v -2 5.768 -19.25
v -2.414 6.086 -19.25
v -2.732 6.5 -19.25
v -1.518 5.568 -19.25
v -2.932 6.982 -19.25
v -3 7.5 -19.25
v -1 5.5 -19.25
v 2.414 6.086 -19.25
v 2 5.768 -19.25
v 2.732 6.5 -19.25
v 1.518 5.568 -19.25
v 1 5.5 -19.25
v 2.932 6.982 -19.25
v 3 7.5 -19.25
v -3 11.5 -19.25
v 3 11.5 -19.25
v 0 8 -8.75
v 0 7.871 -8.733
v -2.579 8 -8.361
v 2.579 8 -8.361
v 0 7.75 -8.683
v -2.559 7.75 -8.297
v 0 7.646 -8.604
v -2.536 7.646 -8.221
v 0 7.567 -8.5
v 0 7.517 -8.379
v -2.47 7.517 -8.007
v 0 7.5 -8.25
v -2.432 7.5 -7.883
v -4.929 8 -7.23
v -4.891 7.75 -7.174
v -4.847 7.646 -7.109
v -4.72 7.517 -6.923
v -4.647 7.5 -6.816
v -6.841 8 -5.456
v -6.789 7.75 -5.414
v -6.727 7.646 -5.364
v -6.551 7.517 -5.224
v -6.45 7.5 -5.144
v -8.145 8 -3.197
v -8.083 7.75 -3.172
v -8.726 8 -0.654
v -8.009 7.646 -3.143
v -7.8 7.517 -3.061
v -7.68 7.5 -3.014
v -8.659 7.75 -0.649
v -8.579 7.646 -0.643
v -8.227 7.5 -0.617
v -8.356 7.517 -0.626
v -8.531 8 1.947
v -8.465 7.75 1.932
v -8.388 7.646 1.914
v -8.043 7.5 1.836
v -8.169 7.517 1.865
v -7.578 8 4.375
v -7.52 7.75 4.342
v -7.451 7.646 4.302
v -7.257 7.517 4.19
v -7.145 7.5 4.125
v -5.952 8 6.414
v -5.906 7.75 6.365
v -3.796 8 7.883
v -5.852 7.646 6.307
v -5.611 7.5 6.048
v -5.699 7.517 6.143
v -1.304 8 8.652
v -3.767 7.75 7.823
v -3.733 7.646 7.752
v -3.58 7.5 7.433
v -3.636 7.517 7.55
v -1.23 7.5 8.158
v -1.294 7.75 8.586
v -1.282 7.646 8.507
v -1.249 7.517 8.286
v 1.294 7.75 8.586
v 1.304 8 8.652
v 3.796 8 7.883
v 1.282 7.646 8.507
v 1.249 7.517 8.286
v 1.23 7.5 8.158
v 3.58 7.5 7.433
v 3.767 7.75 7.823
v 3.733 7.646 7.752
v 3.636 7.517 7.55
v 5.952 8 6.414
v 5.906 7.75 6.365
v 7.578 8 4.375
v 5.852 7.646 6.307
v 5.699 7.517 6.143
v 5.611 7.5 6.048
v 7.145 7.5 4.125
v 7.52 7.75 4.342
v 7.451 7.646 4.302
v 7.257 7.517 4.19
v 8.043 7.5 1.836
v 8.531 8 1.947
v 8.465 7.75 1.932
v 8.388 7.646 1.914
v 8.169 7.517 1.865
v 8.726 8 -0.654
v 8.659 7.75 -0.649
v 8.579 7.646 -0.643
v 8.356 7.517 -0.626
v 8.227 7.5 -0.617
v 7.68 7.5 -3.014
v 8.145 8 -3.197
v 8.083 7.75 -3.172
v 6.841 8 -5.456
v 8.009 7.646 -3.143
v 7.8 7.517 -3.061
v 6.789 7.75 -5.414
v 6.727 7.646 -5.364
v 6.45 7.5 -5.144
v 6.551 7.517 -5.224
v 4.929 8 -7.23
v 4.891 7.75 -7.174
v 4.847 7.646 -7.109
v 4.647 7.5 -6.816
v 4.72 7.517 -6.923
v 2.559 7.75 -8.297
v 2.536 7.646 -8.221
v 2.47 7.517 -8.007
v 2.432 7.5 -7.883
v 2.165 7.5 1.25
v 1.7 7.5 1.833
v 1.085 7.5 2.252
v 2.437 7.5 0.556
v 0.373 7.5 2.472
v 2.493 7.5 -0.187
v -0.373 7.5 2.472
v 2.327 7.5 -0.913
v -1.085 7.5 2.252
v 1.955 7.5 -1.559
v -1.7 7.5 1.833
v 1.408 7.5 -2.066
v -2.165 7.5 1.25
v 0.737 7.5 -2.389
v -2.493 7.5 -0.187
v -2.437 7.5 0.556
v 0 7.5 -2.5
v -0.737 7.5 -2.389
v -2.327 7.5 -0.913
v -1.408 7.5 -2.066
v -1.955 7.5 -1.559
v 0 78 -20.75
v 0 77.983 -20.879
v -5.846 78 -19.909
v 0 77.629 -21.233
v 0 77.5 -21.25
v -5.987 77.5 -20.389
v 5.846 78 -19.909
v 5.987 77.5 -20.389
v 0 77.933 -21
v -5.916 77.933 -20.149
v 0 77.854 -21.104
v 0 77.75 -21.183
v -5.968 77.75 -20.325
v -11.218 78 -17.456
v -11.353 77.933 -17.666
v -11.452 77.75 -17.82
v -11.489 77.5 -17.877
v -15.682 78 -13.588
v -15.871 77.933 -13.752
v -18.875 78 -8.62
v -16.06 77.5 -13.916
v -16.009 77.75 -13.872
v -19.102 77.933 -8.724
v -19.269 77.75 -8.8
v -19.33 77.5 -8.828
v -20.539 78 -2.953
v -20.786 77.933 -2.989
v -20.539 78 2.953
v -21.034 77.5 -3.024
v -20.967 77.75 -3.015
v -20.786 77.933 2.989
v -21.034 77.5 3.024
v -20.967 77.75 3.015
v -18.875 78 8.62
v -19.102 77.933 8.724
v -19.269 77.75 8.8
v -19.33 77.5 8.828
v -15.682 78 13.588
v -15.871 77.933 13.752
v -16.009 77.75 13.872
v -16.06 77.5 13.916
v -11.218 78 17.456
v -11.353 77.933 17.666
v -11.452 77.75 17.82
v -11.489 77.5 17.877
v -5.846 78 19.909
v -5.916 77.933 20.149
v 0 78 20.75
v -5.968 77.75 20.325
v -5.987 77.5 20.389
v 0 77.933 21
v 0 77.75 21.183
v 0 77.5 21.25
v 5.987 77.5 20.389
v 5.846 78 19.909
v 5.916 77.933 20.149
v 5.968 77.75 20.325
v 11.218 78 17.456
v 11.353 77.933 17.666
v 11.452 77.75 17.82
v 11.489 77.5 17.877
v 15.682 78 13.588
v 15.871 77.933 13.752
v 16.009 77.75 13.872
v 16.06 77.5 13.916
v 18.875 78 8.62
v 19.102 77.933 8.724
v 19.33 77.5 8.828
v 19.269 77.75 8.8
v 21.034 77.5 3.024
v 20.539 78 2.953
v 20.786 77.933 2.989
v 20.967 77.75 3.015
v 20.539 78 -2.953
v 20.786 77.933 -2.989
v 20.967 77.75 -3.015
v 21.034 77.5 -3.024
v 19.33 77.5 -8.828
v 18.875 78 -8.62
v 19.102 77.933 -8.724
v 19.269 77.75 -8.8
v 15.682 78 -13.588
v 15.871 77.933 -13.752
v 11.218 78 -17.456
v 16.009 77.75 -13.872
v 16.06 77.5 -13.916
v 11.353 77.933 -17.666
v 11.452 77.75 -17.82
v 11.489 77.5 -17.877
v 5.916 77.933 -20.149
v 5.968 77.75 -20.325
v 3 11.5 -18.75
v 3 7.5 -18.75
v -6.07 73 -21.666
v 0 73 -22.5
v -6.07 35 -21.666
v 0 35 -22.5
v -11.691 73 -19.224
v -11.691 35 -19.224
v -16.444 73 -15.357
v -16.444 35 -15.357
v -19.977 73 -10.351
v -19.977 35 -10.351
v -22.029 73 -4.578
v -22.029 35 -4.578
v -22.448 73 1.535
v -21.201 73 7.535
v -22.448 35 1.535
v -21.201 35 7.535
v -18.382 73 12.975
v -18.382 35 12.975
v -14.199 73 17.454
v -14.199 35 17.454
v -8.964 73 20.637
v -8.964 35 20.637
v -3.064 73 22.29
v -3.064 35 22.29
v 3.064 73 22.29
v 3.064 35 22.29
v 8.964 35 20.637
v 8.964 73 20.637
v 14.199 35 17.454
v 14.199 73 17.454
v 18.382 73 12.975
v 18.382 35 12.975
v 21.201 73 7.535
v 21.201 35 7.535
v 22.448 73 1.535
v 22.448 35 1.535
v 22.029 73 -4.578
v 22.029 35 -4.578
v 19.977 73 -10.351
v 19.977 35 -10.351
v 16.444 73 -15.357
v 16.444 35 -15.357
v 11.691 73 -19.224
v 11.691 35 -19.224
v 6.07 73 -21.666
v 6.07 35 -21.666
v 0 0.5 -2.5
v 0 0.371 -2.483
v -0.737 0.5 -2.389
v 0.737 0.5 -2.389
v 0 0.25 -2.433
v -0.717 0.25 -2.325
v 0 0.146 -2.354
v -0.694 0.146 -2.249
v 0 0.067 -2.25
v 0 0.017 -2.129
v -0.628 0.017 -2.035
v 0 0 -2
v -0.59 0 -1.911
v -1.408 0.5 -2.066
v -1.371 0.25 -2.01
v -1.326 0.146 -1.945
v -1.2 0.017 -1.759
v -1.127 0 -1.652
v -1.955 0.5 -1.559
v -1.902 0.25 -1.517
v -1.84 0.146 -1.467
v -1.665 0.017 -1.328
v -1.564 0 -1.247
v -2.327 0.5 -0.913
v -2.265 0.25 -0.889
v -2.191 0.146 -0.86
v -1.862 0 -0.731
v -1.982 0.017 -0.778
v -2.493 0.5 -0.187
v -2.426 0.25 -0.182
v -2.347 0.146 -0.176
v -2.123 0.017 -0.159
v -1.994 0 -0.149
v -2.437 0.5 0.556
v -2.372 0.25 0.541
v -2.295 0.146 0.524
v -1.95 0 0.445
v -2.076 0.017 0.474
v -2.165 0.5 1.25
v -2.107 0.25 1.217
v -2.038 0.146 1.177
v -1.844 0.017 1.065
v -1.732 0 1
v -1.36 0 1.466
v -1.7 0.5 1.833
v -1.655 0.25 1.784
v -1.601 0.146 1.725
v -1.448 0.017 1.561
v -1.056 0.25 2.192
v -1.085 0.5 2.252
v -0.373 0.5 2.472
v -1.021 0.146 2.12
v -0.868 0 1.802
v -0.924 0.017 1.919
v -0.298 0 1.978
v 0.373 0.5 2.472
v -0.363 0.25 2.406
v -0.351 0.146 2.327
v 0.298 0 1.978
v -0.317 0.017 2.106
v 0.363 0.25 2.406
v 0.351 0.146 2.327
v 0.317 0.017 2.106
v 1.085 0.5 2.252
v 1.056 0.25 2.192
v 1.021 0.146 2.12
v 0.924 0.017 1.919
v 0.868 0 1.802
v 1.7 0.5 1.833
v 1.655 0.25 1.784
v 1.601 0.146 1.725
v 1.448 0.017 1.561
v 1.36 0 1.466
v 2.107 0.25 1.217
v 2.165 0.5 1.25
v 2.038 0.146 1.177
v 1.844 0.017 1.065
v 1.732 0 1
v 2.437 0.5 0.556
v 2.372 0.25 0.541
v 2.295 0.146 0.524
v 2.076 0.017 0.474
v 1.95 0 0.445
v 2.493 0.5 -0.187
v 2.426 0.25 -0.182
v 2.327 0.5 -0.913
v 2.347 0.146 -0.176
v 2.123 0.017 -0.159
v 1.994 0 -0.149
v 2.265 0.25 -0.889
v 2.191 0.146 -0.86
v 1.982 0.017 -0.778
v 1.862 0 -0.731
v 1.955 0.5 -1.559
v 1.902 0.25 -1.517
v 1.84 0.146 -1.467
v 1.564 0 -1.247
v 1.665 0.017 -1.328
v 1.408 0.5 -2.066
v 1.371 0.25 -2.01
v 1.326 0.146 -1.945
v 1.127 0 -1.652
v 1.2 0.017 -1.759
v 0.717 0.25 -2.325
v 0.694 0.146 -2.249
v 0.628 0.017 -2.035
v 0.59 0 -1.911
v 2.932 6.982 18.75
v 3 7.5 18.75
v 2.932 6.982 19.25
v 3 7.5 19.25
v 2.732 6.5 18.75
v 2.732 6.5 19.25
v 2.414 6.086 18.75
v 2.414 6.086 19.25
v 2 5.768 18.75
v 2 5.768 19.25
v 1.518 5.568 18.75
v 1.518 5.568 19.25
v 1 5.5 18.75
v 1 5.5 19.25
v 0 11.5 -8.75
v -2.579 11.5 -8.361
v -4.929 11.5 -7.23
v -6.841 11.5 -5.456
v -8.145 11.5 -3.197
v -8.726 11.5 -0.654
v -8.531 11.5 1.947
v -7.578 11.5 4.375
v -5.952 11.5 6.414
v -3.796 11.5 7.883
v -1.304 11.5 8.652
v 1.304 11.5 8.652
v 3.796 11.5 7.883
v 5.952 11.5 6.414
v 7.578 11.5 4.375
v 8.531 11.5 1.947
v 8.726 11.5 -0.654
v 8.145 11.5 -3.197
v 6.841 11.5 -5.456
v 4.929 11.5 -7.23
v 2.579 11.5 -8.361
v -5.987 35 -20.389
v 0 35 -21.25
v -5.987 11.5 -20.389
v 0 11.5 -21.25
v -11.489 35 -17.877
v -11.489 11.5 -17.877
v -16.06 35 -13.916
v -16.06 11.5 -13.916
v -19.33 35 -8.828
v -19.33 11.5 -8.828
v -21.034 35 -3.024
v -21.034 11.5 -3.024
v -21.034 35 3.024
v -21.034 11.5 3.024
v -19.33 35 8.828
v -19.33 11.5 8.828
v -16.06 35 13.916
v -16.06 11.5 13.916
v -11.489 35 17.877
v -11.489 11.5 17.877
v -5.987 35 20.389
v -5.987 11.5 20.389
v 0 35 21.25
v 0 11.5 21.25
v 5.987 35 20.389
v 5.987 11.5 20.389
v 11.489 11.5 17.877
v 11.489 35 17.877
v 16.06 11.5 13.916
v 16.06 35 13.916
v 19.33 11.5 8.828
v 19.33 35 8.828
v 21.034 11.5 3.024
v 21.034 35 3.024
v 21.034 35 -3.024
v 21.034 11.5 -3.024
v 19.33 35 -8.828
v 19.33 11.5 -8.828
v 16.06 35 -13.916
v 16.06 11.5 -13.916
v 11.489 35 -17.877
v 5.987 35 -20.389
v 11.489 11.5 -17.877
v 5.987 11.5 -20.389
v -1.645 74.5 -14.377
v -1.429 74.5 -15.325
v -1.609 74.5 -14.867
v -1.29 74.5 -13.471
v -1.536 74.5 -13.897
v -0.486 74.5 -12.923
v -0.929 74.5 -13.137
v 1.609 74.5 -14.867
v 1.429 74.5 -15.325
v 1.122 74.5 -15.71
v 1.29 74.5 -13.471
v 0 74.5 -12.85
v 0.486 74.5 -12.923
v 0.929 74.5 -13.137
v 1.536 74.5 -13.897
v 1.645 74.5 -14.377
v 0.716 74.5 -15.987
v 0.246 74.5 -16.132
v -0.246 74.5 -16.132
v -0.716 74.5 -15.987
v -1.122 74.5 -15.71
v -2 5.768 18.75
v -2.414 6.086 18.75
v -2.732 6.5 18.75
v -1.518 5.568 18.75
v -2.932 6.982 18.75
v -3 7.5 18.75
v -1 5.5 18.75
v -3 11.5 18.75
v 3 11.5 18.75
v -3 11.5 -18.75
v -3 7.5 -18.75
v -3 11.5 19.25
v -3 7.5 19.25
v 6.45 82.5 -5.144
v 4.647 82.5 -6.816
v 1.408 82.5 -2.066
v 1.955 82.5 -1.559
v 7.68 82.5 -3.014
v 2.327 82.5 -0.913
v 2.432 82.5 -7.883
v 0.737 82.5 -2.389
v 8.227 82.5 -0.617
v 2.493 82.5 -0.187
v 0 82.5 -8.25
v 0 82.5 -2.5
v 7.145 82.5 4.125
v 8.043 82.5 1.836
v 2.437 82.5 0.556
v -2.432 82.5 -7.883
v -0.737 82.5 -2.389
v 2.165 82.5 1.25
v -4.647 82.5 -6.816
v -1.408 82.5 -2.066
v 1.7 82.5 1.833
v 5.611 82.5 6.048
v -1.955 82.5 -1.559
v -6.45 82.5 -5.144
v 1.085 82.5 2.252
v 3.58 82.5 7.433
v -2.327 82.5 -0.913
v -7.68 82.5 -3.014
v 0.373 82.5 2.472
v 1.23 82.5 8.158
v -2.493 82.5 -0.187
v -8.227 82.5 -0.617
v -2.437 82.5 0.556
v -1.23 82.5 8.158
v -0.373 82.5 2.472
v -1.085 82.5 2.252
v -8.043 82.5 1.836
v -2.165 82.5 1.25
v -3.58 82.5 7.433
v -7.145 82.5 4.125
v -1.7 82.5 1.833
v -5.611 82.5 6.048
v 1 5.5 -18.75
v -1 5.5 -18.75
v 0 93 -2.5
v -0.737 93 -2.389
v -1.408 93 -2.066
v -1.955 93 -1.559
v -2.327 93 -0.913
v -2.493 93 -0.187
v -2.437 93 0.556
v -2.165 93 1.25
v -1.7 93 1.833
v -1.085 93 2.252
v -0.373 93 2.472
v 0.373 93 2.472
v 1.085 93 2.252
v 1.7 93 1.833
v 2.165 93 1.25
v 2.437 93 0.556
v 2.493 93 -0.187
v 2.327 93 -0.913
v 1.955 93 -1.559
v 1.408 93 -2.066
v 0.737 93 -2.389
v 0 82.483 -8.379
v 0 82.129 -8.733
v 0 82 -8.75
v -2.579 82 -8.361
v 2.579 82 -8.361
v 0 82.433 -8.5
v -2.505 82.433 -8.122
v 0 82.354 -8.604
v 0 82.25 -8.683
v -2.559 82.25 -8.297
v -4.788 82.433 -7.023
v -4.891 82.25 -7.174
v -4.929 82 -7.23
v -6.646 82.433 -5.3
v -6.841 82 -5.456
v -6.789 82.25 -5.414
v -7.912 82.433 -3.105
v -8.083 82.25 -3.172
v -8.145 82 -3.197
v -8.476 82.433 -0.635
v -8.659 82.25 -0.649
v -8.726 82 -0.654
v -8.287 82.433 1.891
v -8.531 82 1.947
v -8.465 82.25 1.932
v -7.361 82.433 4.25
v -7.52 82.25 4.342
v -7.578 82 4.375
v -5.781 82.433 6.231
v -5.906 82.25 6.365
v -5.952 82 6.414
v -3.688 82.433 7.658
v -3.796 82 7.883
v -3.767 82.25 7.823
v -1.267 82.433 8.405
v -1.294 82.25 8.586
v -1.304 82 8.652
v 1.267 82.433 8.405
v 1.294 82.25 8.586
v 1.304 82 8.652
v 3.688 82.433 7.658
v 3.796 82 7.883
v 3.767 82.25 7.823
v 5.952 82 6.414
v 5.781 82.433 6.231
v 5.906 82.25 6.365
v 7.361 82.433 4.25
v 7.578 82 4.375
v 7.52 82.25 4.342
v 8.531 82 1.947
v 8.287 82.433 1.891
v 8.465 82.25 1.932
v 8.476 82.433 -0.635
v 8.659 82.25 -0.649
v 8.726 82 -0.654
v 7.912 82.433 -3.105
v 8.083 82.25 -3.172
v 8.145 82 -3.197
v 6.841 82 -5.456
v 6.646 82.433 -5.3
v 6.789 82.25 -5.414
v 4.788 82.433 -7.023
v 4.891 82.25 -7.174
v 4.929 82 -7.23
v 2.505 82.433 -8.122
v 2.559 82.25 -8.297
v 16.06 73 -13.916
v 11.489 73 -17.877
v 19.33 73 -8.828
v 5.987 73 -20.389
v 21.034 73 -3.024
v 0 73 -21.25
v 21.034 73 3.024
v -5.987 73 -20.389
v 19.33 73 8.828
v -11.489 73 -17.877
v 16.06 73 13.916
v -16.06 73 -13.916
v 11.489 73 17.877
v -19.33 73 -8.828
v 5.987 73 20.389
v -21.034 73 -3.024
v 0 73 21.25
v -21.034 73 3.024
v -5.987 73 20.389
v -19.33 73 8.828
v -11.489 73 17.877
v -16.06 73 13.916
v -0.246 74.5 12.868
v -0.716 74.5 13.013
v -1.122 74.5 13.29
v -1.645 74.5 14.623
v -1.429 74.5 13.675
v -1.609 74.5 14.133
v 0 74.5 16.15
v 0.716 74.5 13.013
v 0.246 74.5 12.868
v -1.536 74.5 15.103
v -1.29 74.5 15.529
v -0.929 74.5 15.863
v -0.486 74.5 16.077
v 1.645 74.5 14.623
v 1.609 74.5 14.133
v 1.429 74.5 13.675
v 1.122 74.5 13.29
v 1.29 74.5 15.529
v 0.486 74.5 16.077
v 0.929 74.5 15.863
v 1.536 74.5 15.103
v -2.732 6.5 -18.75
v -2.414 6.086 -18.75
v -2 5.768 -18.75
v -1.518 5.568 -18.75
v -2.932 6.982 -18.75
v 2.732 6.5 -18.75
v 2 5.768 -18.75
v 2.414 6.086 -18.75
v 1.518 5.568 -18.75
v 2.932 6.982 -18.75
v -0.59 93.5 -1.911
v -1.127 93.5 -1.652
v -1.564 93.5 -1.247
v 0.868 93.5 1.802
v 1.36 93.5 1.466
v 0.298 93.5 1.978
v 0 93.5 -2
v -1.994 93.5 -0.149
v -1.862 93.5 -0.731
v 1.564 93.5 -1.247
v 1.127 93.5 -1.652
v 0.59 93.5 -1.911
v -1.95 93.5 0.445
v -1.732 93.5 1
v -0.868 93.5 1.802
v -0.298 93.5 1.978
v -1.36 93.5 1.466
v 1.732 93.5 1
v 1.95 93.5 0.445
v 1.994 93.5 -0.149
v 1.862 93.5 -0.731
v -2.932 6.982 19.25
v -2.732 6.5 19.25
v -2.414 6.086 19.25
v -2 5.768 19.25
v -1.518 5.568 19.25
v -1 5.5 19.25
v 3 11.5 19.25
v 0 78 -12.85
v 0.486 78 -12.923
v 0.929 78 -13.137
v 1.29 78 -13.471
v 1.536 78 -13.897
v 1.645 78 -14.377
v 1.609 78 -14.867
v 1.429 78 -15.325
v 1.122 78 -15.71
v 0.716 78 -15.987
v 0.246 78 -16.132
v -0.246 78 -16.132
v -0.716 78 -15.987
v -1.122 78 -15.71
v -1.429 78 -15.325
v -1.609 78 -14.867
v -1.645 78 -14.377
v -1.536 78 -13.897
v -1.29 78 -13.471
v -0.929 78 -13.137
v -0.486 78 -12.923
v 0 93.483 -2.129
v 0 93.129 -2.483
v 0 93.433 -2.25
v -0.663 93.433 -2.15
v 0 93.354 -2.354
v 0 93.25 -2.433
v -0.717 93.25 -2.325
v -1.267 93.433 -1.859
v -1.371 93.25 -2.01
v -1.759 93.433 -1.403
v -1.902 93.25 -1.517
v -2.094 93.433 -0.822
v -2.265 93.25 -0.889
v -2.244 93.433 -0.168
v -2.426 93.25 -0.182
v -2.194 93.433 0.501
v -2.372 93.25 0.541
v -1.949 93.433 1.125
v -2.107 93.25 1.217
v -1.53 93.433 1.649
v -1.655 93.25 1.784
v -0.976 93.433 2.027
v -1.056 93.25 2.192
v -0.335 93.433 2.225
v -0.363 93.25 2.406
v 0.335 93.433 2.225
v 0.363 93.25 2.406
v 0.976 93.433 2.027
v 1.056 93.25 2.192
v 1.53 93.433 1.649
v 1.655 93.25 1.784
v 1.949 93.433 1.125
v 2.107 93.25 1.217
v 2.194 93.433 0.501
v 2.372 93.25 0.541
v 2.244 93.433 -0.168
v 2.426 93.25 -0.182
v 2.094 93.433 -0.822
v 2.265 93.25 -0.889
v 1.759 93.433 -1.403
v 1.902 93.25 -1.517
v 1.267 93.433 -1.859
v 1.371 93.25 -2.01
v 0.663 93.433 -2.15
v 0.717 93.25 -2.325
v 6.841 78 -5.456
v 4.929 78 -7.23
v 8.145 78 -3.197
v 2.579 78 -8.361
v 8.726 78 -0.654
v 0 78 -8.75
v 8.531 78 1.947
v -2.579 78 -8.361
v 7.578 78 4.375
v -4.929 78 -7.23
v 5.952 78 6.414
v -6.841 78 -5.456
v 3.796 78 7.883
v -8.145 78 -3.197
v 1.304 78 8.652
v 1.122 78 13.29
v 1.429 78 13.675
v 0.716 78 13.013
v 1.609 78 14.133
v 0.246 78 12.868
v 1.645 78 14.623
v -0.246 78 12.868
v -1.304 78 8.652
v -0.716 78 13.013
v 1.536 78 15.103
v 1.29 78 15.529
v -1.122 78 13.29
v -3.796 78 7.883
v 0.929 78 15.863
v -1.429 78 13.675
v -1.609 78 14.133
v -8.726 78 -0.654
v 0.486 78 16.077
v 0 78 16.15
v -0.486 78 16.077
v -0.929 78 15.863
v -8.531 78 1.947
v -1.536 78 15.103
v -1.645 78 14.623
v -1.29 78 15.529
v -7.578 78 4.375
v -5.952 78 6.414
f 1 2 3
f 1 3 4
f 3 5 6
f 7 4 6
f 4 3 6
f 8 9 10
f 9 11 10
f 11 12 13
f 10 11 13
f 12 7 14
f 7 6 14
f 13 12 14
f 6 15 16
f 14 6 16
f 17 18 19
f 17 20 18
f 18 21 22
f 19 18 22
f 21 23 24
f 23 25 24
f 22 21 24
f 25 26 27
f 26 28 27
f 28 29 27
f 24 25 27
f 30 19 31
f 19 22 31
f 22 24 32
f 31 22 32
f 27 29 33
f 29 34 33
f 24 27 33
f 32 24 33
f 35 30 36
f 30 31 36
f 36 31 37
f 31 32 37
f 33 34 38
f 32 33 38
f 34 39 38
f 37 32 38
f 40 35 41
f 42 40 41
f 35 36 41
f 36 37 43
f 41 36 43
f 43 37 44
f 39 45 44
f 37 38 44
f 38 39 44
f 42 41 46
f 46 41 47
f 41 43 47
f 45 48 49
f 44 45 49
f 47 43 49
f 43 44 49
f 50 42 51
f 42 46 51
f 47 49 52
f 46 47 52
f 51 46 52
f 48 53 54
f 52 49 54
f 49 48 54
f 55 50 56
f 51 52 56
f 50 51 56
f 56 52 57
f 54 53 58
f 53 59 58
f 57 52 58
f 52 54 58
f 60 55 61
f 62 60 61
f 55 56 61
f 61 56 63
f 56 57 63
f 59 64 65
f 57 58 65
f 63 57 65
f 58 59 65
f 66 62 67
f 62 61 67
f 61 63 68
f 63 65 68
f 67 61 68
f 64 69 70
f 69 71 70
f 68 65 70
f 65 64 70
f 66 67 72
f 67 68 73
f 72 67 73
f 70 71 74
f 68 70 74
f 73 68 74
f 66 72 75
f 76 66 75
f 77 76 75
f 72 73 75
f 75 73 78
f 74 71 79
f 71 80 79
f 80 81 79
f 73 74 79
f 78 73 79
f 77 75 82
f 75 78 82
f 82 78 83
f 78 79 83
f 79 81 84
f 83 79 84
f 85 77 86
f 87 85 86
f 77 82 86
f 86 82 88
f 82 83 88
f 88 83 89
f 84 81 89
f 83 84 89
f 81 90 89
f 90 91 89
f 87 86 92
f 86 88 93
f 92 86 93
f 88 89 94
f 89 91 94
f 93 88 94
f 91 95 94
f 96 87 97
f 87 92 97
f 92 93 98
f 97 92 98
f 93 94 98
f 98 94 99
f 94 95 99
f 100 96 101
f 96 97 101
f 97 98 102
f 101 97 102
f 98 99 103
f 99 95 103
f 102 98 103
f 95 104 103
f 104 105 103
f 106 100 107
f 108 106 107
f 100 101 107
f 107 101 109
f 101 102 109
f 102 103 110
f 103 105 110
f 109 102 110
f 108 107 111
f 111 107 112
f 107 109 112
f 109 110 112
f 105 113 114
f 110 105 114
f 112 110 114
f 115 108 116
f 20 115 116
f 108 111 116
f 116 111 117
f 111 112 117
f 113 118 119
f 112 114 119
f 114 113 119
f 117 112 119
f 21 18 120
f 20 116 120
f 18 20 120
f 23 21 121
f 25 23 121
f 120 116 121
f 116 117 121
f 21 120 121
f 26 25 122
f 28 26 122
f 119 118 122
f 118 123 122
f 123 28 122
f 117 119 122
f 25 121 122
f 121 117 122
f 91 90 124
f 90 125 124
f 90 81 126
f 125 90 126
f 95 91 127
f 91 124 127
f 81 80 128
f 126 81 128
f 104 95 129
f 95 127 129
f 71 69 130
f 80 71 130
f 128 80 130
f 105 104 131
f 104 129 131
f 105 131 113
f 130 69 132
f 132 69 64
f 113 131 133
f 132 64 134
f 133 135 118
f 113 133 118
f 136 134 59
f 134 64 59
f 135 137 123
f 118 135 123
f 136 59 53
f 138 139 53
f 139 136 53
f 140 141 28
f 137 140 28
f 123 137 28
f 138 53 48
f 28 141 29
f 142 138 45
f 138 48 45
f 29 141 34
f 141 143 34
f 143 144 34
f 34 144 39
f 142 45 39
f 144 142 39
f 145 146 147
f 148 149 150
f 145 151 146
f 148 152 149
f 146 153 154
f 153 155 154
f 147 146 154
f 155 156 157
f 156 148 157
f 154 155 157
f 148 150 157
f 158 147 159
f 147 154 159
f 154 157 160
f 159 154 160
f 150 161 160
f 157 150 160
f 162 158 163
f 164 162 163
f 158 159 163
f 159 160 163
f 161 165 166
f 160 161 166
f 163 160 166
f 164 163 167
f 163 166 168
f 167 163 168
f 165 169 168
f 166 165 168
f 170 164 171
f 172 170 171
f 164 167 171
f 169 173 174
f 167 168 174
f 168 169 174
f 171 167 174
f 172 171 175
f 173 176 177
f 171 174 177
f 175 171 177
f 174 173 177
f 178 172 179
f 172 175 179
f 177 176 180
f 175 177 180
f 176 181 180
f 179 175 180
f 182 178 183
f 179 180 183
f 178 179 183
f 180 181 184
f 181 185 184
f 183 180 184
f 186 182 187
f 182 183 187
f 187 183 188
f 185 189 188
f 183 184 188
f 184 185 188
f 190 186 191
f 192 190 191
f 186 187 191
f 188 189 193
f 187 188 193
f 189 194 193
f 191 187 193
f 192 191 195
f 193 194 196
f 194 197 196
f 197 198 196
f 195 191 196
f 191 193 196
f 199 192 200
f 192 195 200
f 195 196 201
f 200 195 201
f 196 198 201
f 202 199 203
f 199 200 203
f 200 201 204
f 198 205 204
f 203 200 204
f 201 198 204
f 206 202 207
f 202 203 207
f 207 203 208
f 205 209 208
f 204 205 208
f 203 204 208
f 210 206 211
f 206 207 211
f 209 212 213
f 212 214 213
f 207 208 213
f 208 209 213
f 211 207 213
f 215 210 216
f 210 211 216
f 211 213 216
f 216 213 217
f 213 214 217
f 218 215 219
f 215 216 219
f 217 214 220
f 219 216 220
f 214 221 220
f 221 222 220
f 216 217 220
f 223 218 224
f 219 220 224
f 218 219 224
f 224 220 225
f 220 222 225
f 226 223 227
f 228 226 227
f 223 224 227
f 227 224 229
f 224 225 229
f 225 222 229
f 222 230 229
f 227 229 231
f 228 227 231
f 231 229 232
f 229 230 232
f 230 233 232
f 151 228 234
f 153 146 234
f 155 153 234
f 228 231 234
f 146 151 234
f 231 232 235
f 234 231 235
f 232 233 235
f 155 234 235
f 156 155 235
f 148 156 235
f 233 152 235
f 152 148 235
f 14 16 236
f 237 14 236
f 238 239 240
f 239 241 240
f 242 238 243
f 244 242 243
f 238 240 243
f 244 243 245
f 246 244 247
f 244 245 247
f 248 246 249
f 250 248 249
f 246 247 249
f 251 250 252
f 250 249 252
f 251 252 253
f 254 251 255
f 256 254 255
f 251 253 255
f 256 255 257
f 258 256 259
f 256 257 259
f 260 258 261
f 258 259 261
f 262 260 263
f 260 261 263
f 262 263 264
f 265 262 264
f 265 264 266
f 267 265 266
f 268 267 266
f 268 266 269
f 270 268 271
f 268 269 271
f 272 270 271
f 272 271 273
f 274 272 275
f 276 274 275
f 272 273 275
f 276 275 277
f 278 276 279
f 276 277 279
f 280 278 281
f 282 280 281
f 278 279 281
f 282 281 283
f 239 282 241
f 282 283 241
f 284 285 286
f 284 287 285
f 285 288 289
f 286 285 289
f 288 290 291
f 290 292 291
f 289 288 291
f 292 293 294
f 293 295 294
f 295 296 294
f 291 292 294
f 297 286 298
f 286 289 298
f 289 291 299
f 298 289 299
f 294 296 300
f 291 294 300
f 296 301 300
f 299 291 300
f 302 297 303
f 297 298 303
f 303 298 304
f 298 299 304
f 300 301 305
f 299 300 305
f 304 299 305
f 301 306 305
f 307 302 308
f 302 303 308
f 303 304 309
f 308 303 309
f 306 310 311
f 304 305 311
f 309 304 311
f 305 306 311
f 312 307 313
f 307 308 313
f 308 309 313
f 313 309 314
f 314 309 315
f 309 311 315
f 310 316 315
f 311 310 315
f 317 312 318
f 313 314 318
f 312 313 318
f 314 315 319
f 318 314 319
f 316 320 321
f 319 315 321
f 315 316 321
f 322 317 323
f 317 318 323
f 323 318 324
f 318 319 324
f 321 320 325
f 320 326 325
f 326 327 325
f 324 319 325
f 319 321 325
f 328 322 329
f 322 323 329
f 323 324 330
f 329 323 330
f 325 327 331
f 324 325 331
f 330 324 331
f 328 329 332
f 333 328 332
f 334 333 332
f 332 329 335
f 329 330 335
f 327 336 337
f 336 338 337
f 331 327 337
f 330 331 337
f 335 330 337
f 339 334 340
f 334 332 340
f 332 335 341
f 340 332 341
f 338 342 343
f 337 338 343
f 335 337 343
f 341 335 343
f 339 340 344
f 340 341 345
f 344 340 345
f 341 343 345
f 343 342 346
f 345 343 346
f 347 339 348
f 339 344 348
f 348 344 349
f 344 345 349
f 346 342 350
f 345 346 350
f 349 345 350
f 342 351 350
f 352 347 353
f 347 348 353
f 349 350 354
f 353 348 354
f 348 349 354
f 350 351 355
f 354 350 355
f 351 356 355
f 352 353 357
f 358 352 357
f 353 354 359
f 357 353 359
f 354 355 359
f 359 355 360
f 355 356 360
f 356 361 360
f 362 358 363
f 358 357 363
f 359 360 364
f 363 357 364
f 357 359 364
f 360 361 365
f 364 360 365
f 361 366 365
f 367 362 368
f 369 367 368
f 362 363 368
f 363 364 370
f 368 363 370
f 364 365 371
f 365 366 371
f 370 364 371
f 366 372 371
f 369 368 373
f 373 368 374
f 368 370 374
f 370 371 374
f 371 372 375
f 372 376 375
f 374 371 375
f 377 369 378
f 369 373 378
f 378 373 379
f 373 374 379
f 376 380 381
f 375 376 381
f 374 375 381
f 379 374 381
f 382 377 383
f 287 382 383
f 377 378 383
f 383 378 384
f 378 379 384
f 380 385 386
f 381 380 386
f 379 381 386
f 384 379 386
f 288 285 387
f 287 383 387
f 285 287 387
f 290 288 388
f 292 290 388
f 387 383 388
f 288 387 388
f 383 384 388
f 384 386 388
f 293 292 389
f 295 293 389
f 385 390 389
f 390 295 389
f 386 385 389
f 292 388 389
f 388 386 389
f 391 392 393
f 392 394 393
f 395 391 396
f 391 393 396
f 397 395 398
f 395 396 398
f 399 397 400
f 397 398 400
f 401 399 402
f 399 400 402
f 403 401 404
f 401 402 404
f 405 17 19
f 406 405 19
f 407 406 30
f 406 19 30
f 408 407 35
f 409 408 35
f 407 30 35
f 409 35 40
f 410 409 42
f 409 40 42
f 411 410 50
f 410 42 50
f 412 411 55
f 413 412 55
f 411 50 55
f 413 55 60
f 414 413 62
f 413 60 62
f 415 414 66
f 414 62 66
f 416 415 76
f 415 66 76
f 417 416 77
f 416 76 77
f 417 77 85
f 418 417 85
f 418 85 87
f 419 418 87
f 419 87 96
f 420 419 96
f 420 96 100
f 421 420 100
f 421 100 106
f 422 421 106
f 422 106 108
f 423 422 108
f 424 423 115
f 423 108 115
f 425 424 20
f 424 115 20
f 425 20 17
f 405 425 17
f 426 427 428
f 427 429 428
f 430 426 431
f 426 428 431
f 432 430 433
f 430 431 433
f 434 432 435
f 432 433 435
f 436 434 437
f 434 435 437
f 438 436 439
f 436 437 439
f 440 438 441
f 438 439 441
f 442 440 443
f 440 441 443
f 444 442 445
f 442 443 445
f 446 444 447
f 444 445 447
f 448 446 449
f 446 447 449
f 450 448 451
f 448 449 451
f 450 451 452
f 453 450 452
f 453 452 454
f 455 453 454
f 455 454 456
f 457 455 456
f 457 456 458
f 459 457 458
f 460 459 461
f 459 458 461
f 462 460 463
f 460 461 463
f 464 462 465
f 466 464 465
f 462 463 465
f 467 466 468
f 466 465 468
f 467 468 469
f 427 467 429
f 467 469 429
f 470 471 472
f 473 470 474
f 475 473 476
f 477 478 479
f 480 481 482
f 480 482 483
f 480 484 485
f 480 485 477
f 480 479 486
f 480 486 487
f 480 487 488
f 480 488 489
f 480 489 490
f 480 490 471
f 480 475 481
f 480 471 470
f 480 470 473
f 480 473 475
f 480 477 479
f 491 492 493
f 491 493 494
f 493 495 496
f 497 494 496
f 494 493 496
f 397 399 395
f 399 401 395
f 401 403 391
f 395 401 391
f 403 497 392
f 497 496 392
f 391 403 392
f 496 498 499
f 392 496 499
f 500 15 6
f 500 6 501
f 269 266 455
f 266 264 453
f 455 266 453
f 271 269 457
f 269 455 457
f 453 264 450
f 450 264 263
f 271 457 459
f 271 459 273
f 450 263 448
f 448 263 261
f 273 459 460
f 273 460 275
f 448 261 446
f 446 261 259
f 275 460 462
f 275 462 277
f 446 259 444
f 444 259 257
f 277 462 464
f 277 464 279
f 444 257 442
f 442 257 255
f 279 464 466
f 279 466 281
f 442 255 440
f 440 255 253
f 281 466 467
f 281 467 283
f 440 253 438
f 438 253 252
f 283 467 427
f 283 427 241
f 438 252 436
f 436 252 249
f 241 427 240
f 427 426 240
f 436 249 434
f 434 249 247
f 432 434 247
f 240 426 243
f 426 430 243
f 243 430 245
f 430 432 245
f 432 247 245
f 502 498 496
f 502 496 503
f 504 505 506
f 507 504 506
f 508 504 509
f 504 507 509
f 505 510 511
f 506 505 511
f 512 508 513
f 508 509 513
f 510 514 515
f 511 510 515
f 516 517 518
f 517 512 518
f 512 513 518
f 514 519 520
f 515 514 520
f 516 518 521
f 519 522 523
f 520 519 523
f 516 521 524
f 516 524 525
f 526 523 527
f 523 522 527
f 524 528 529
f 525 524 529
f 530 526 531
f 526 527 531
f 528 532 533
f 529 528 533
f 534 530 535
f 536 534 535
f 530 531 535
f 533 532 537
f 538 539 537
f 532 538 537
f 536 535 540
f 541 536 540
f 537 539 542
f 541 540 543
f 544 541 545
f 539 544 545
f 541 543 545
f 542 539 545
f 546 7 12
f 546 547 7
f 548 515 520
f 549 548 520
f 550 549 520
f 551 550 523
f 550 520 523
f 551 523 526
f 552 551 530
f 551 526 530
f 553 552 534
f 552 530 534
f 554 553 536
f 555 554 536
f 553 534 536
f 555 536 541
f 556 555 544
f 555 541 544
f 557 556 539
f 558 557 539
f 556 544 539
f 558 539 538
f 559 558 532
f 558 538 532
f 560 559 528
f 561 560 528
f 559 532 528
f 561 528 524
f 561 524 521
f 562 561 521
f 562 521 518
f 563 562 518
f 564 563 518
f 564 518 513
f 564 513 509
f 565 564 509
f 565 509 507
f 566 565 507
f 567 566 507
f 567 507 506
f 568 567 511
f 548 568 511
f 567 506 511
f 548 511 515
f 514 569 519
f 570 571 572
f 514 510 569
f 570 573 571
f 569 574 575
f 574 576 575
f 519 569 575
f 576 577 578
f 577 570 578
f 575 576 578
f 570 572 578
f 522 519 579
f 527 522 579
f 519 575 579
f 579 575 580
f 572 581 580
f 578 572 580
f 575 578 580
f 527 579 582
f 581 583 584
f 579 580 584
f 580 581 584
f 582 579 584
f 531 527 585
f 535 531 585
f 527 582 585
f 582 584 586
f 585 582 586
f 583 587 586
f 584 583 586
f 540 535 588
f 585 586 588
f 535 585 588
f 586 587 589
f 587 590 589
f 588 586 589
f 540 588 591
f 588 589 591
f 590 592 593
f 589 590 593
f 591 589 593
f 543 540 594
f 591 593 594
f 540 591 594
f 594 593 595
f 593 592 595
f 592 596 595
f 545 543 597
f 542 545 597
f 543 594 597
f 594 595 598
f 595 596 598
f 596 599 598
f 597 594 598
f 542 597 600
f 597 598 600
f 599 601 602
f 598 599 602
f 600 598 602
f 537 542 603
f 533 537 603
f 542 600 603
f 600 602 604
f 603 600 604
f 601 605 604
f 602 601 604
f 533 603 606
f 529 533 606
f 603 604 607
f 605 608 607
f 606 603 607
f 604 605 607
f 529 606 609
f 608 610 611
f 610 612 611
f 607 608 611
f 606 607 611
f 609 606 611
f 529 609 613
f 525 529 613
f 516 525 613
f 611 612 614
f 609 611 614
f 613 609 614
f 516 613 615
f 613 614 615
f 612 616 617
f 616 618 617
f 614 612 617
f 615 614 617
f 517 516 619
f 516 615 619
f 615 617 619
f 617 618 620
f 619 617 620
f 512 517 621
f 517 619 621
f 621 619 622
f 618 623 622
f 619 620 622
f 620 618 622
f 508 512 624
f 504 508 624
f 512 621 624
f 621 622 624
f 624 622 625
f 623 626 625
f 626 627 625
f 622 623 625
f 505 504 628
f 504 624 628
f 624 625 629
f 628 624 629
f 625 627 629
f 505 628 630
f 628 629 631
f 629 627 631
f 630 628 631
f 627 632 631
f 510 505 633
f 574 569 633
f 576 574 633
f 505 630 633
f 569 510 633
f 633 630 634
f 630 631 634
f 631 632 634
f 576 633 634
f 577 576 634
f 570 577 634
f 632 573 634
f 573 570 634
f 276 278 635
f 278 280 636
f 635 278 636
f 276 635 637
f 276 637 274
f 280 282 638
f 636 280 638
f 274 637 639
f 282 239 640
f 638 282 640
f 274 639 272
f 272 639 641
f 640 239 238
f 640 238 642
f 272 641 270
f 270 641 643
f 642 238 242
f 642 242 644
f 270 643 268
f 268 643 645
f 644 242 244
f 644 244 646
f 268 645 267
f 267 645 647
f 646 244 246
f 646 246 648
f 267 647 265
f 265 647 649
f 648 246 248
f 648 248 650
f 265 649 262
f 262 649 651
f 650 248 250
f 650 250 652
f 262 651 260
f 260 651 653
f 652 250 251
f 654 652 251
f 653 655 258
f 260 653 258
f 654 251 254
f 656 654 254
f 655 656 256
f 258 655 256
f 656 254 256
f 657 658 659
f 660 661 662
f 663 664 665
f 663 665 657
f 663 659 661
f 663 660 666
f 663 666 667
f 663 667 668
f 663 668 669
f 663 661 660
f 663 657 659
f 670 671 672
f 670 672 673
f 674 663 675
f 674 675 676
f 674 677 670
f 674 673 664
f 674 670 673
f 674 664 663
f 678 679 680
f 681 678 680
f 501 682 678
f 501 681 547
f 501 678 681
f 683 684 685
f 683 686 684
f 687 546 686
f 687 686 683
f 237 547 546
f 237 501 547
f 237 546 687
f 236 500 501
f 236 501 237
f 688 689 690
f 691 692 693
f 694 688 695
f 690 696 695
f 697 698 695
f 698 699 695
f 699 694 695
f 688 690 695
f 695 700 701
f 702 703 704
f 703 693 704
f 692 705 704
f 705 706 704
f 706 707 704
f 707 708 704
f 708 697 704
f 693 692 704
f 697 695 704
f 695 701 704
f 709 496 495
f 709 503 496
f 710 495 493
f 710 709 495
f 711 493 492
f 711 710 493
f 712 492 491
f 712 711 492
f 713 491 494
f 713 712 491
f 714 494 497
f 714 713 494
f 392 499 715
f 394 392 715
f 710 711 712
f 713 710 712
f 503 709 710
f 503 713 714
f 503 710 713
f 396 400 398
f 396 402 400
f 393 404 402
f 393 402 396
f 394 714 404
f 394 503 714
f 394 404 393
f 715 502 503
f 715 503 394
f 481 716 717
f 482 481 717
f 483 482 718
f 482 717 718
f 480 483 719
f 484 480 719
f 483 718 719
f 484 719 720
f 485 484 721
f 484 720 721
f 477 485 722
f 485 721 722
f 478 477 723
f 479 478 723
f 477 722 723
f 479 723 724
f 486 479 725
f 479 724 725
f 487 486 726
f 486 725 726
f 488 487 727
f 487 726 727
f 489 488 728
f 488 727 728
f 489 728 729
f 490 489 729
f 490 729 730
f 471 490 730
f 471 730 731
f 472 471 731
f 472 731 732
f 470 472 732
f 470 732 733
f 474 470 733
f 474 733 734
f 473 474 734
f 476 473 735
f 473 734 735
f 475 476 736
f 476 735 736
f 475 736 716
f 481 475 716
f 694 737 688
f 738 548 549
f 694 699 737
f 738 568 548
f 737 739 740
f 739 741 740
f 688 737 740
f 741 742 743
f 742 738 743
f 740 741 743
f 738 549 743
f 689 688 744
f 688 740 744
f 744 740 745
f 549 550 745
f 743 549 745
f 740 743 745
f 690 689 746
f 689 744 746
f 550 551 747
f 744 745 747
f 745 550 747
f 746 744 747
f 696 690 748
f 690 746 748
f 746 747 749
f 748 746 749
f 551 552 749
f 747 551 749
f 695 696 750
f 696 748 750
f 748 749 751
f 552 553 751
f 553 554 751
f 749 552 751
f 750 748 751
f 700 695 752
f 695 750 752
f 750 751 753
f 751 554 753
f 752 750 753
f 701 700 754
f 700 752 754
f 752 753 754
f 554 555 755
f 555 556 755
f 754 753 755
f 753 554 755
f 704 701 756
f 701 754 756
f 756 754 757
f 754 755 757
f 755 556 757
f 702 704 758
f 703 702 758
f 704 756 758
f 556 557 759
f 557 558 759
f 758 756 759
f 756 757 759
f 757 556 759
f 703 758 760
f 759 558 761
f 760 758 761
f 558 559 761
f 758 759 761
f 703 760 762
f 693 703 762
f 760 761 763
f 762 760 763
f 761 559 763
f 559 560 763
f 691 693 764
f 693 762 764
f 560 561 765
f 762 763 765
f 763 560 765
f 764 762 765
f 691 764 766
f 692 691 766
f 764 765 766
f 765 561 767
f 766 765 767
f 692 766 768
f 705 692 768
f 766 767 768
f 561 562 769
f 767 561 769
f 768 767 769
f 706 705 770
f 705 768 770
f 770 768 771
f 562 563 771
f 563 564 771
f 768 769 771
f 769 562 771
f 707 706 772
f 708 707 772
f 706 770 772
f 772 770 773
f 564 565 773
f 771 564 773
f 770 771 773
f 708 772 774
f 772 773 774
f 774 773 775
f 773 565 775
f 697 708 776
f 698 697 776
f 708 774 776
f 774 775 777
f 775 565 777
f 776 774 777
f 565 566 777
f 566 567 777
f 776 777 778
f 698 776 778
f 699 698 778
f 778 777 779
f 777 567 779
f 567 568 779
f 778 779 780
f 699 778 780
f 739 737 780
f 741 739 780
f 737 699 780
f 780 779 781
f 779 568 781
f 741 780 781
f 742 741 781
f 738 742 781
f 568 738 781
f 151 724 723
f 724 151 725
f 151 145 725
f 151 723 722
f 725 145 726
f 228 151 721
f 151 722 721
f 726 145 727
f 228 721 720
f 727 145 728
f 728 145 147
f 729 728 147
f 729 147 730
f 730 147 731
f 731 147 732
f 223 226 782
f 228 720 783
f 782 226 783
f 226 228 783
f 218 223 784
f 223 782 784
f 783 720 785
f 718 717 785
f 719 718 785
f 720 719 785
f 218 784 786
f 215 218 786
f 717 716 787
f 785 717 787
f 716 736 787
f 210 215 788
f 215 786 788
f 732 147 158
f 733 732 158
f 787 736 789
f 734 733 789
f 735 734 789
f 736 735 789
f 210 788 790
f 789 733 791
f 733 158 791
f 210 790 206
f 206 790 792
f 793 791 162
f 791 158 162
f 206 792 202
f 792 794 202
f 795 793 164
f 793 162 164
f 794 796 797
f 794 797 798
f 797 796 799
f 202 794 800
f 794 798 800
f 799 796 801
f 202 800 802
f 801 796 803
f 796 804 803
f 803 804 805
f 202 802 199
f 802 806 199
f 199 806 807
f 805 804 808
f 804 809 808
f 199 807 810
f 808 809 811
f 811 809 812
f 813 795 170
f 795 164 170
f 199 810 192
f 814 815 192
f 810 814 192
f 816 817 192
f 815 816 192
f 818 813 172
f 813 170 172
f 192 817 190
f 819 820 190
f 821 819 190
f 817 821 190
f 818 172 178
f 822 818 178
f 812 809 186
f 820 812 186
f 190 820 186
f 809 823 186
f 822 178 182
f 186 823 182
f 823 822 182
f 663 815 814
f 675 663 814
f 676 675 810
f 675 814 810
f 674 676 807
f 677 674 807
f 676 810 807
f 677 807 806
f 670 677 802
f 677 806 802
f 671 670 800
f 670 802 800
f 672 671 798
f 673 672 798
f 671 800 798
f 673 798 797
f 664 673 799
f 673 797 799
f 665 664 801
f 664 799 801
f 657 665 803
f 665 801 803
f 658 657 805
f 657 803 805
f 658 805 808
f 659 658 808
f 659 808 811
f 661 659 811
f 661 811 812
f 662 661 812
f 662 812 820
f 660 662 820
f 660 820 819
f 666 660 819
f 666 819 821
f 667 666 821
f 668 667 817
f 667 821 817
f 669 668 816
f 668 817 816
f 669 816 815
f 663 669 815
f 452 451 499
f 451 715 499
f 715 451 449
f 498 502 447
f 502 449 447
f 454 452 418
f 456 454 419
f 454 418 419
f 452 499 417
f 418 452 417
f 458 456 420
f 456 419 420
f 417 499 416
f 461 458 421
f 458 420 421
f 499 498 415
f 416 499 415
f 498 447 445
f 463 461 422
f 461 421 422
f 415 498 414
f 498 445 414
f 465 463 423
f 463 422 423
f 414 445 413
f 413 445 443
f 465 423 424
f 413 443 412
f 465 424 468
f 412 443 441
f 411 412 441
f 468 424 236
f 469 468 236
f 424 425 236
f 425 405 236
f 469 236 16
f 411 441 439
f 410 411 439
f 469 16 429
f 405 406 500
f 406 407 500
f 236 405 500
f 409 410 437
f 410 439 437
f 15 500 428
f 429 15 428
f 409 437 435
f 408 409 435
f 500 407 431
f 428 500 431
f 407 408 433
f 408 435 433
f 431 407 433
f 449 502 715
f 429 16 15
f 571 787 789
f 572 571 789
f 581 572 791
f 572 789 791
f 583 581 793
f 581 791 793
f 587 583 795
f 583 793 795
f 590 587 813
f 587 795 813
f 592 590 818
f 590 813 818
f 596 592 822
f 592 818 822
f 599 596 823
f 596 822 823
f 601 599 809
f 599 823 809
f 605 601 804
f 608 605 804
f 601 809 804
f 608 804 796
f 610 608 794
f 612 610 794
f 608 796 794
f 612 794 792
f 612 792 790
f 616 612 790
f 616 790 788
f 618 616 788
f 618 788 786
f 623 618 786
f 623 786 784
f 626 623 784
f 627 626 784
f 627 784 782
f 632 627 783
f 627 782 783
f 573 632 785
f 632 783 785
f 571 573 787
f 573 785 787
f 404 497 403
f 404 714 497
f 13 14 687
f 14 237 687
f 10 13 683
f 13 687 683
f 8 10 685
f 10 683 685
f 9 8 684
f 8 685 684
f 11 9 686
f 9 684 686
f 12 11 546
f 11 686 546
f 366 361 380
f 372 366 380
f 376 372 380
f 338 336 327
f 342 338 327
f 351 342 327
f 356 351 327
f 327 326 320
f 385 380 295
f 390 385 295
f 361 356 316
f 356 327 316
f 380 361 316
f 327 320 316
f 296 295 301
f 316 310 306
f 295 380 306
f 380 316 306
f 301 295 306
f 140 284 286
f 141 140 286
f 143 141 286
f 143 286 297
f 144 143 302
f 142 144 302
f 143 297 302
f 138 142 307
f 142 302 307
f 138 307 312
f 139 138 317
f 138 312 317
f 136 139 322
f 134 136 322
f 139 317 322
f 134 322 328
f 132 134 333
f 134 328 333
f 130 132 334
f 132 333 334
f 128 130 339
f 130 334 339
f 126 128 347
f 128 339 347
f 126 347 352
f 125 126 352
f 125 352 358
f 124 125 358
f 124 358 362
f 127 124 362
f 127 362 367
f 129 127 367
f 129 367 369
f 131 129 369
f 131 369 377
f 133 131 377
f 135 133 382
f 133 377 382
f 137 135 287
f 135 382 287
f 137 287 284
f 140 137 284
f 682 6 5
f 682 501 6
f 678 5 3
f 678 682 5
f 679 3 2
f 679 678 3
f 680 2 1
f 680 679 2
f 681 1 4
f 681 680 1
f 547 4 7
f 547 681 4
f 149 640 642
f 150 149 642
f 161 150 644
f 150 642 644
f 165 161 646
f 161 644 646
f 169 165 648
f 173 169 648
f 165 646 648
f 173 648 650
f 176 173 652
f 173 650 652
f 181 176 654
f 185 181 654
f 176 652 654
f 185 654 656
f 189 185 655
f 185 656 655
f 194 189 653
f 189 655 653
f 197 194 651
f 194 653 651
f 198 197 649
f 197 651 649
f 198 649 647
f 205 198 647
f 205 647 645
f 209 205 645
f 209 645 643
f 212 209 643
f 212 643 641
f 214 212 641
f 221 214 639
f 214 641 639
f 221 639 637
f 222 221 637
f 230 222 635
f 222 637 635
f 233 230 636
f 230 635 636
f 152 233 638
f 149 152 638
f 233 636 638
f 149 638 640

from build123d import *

# Parameters (mm, degrees)
SKETCH_2_W          = 6
SKETCH_2_H          = 0.5
EXTRUDE_1_DEPTH     = 6
SKETCH_3_R          = 1.65
CUT_EXTRUDE_1_DEPTH = 3.5
FILLET_1_R          = 0.5
FILLET_2_R          = 2


with BuildPart() as part:
    # Эскиз1 → Повернуть1 (revolve)
    with BuildSketch(Plane.XY, mode=Mode.PRIVATE) as revolve_1_sk:
        Polygon((0, 0), (0, 93.5), (2.5, 93.5), (2.5, 82.5), (8.75, 82.5), (8.75, 78), (21.25, 78), (21.25, 73), (22.5, 73), (22.5, 35), (21.25, 35), (21.25, 11.5), (8.75, 11.5), (8.75, 7.5), (2.5, 7.5), (2.5, 0), align=None)
    revolve(revolve_1_sk.sketch.rotate(Axis((0, 0, 0), (0, 1, 0)), 90), axis=Axis((0, 0, 0), (0, 1, 0)))

    # Эскиз2 → Бобышка-Вытянуть1 (add)
    with BuildSketch(Plane.XZ.offset(-11.5)):
        with Locations((0, -19)):
            Rectangle(SKETCH_2_W, SKETCH_2_H)
        with Locations((0, 19)):
            Rectangle(SKETCH_2_W, SKETCH_2_H)
    extrude(amount=EXTRUDE_1_DEPTH)

    # Эскиз3 → Вырез-Вытянуть1 (cut)
    with BuildSketch(Plane(origin=(0, 78, 0), x_dir=(1, 0, 0), z_dir=(0, 1, 0))):
        with Locations(Location((0, -14.5, 0), (0, 0, 270))):
            Circle(SKETCH_3_R)
        with Locations(Location((0, 14.5, 0), (0, 0, 270))):
            Circle(SKETCH_3_R)
    extrude(amount=-CUT_EXTRUDE_1_DEPTH, mode=Mode.SUBTRACT)

    # Скругление1
    fillet_1_edges = [part.edges().sort_by_distance(p)[0] for p in [
        (0, 0, 2.5),
        (0, 7.5, 8.75),
        (0, 78, 21.25),
        (0, 82.5, 8.75),
        (0, 93.5, 2.5),
    ]]
    fillet(fillet_1_edges, radius=FILLET_1_R)

    # Скругление2
    fillet_2_edges = [part.edges().sort_by_distance(p)[0] for p in [
        (-3, 5.5, 19),
        (3, 5.5, 19),
        (-3, 5.5, -19),
        (3, 5.5, -19),
    ]]
    fillet(fillet_2_edges, radius=FILLET_2_R)


solid = part.part
